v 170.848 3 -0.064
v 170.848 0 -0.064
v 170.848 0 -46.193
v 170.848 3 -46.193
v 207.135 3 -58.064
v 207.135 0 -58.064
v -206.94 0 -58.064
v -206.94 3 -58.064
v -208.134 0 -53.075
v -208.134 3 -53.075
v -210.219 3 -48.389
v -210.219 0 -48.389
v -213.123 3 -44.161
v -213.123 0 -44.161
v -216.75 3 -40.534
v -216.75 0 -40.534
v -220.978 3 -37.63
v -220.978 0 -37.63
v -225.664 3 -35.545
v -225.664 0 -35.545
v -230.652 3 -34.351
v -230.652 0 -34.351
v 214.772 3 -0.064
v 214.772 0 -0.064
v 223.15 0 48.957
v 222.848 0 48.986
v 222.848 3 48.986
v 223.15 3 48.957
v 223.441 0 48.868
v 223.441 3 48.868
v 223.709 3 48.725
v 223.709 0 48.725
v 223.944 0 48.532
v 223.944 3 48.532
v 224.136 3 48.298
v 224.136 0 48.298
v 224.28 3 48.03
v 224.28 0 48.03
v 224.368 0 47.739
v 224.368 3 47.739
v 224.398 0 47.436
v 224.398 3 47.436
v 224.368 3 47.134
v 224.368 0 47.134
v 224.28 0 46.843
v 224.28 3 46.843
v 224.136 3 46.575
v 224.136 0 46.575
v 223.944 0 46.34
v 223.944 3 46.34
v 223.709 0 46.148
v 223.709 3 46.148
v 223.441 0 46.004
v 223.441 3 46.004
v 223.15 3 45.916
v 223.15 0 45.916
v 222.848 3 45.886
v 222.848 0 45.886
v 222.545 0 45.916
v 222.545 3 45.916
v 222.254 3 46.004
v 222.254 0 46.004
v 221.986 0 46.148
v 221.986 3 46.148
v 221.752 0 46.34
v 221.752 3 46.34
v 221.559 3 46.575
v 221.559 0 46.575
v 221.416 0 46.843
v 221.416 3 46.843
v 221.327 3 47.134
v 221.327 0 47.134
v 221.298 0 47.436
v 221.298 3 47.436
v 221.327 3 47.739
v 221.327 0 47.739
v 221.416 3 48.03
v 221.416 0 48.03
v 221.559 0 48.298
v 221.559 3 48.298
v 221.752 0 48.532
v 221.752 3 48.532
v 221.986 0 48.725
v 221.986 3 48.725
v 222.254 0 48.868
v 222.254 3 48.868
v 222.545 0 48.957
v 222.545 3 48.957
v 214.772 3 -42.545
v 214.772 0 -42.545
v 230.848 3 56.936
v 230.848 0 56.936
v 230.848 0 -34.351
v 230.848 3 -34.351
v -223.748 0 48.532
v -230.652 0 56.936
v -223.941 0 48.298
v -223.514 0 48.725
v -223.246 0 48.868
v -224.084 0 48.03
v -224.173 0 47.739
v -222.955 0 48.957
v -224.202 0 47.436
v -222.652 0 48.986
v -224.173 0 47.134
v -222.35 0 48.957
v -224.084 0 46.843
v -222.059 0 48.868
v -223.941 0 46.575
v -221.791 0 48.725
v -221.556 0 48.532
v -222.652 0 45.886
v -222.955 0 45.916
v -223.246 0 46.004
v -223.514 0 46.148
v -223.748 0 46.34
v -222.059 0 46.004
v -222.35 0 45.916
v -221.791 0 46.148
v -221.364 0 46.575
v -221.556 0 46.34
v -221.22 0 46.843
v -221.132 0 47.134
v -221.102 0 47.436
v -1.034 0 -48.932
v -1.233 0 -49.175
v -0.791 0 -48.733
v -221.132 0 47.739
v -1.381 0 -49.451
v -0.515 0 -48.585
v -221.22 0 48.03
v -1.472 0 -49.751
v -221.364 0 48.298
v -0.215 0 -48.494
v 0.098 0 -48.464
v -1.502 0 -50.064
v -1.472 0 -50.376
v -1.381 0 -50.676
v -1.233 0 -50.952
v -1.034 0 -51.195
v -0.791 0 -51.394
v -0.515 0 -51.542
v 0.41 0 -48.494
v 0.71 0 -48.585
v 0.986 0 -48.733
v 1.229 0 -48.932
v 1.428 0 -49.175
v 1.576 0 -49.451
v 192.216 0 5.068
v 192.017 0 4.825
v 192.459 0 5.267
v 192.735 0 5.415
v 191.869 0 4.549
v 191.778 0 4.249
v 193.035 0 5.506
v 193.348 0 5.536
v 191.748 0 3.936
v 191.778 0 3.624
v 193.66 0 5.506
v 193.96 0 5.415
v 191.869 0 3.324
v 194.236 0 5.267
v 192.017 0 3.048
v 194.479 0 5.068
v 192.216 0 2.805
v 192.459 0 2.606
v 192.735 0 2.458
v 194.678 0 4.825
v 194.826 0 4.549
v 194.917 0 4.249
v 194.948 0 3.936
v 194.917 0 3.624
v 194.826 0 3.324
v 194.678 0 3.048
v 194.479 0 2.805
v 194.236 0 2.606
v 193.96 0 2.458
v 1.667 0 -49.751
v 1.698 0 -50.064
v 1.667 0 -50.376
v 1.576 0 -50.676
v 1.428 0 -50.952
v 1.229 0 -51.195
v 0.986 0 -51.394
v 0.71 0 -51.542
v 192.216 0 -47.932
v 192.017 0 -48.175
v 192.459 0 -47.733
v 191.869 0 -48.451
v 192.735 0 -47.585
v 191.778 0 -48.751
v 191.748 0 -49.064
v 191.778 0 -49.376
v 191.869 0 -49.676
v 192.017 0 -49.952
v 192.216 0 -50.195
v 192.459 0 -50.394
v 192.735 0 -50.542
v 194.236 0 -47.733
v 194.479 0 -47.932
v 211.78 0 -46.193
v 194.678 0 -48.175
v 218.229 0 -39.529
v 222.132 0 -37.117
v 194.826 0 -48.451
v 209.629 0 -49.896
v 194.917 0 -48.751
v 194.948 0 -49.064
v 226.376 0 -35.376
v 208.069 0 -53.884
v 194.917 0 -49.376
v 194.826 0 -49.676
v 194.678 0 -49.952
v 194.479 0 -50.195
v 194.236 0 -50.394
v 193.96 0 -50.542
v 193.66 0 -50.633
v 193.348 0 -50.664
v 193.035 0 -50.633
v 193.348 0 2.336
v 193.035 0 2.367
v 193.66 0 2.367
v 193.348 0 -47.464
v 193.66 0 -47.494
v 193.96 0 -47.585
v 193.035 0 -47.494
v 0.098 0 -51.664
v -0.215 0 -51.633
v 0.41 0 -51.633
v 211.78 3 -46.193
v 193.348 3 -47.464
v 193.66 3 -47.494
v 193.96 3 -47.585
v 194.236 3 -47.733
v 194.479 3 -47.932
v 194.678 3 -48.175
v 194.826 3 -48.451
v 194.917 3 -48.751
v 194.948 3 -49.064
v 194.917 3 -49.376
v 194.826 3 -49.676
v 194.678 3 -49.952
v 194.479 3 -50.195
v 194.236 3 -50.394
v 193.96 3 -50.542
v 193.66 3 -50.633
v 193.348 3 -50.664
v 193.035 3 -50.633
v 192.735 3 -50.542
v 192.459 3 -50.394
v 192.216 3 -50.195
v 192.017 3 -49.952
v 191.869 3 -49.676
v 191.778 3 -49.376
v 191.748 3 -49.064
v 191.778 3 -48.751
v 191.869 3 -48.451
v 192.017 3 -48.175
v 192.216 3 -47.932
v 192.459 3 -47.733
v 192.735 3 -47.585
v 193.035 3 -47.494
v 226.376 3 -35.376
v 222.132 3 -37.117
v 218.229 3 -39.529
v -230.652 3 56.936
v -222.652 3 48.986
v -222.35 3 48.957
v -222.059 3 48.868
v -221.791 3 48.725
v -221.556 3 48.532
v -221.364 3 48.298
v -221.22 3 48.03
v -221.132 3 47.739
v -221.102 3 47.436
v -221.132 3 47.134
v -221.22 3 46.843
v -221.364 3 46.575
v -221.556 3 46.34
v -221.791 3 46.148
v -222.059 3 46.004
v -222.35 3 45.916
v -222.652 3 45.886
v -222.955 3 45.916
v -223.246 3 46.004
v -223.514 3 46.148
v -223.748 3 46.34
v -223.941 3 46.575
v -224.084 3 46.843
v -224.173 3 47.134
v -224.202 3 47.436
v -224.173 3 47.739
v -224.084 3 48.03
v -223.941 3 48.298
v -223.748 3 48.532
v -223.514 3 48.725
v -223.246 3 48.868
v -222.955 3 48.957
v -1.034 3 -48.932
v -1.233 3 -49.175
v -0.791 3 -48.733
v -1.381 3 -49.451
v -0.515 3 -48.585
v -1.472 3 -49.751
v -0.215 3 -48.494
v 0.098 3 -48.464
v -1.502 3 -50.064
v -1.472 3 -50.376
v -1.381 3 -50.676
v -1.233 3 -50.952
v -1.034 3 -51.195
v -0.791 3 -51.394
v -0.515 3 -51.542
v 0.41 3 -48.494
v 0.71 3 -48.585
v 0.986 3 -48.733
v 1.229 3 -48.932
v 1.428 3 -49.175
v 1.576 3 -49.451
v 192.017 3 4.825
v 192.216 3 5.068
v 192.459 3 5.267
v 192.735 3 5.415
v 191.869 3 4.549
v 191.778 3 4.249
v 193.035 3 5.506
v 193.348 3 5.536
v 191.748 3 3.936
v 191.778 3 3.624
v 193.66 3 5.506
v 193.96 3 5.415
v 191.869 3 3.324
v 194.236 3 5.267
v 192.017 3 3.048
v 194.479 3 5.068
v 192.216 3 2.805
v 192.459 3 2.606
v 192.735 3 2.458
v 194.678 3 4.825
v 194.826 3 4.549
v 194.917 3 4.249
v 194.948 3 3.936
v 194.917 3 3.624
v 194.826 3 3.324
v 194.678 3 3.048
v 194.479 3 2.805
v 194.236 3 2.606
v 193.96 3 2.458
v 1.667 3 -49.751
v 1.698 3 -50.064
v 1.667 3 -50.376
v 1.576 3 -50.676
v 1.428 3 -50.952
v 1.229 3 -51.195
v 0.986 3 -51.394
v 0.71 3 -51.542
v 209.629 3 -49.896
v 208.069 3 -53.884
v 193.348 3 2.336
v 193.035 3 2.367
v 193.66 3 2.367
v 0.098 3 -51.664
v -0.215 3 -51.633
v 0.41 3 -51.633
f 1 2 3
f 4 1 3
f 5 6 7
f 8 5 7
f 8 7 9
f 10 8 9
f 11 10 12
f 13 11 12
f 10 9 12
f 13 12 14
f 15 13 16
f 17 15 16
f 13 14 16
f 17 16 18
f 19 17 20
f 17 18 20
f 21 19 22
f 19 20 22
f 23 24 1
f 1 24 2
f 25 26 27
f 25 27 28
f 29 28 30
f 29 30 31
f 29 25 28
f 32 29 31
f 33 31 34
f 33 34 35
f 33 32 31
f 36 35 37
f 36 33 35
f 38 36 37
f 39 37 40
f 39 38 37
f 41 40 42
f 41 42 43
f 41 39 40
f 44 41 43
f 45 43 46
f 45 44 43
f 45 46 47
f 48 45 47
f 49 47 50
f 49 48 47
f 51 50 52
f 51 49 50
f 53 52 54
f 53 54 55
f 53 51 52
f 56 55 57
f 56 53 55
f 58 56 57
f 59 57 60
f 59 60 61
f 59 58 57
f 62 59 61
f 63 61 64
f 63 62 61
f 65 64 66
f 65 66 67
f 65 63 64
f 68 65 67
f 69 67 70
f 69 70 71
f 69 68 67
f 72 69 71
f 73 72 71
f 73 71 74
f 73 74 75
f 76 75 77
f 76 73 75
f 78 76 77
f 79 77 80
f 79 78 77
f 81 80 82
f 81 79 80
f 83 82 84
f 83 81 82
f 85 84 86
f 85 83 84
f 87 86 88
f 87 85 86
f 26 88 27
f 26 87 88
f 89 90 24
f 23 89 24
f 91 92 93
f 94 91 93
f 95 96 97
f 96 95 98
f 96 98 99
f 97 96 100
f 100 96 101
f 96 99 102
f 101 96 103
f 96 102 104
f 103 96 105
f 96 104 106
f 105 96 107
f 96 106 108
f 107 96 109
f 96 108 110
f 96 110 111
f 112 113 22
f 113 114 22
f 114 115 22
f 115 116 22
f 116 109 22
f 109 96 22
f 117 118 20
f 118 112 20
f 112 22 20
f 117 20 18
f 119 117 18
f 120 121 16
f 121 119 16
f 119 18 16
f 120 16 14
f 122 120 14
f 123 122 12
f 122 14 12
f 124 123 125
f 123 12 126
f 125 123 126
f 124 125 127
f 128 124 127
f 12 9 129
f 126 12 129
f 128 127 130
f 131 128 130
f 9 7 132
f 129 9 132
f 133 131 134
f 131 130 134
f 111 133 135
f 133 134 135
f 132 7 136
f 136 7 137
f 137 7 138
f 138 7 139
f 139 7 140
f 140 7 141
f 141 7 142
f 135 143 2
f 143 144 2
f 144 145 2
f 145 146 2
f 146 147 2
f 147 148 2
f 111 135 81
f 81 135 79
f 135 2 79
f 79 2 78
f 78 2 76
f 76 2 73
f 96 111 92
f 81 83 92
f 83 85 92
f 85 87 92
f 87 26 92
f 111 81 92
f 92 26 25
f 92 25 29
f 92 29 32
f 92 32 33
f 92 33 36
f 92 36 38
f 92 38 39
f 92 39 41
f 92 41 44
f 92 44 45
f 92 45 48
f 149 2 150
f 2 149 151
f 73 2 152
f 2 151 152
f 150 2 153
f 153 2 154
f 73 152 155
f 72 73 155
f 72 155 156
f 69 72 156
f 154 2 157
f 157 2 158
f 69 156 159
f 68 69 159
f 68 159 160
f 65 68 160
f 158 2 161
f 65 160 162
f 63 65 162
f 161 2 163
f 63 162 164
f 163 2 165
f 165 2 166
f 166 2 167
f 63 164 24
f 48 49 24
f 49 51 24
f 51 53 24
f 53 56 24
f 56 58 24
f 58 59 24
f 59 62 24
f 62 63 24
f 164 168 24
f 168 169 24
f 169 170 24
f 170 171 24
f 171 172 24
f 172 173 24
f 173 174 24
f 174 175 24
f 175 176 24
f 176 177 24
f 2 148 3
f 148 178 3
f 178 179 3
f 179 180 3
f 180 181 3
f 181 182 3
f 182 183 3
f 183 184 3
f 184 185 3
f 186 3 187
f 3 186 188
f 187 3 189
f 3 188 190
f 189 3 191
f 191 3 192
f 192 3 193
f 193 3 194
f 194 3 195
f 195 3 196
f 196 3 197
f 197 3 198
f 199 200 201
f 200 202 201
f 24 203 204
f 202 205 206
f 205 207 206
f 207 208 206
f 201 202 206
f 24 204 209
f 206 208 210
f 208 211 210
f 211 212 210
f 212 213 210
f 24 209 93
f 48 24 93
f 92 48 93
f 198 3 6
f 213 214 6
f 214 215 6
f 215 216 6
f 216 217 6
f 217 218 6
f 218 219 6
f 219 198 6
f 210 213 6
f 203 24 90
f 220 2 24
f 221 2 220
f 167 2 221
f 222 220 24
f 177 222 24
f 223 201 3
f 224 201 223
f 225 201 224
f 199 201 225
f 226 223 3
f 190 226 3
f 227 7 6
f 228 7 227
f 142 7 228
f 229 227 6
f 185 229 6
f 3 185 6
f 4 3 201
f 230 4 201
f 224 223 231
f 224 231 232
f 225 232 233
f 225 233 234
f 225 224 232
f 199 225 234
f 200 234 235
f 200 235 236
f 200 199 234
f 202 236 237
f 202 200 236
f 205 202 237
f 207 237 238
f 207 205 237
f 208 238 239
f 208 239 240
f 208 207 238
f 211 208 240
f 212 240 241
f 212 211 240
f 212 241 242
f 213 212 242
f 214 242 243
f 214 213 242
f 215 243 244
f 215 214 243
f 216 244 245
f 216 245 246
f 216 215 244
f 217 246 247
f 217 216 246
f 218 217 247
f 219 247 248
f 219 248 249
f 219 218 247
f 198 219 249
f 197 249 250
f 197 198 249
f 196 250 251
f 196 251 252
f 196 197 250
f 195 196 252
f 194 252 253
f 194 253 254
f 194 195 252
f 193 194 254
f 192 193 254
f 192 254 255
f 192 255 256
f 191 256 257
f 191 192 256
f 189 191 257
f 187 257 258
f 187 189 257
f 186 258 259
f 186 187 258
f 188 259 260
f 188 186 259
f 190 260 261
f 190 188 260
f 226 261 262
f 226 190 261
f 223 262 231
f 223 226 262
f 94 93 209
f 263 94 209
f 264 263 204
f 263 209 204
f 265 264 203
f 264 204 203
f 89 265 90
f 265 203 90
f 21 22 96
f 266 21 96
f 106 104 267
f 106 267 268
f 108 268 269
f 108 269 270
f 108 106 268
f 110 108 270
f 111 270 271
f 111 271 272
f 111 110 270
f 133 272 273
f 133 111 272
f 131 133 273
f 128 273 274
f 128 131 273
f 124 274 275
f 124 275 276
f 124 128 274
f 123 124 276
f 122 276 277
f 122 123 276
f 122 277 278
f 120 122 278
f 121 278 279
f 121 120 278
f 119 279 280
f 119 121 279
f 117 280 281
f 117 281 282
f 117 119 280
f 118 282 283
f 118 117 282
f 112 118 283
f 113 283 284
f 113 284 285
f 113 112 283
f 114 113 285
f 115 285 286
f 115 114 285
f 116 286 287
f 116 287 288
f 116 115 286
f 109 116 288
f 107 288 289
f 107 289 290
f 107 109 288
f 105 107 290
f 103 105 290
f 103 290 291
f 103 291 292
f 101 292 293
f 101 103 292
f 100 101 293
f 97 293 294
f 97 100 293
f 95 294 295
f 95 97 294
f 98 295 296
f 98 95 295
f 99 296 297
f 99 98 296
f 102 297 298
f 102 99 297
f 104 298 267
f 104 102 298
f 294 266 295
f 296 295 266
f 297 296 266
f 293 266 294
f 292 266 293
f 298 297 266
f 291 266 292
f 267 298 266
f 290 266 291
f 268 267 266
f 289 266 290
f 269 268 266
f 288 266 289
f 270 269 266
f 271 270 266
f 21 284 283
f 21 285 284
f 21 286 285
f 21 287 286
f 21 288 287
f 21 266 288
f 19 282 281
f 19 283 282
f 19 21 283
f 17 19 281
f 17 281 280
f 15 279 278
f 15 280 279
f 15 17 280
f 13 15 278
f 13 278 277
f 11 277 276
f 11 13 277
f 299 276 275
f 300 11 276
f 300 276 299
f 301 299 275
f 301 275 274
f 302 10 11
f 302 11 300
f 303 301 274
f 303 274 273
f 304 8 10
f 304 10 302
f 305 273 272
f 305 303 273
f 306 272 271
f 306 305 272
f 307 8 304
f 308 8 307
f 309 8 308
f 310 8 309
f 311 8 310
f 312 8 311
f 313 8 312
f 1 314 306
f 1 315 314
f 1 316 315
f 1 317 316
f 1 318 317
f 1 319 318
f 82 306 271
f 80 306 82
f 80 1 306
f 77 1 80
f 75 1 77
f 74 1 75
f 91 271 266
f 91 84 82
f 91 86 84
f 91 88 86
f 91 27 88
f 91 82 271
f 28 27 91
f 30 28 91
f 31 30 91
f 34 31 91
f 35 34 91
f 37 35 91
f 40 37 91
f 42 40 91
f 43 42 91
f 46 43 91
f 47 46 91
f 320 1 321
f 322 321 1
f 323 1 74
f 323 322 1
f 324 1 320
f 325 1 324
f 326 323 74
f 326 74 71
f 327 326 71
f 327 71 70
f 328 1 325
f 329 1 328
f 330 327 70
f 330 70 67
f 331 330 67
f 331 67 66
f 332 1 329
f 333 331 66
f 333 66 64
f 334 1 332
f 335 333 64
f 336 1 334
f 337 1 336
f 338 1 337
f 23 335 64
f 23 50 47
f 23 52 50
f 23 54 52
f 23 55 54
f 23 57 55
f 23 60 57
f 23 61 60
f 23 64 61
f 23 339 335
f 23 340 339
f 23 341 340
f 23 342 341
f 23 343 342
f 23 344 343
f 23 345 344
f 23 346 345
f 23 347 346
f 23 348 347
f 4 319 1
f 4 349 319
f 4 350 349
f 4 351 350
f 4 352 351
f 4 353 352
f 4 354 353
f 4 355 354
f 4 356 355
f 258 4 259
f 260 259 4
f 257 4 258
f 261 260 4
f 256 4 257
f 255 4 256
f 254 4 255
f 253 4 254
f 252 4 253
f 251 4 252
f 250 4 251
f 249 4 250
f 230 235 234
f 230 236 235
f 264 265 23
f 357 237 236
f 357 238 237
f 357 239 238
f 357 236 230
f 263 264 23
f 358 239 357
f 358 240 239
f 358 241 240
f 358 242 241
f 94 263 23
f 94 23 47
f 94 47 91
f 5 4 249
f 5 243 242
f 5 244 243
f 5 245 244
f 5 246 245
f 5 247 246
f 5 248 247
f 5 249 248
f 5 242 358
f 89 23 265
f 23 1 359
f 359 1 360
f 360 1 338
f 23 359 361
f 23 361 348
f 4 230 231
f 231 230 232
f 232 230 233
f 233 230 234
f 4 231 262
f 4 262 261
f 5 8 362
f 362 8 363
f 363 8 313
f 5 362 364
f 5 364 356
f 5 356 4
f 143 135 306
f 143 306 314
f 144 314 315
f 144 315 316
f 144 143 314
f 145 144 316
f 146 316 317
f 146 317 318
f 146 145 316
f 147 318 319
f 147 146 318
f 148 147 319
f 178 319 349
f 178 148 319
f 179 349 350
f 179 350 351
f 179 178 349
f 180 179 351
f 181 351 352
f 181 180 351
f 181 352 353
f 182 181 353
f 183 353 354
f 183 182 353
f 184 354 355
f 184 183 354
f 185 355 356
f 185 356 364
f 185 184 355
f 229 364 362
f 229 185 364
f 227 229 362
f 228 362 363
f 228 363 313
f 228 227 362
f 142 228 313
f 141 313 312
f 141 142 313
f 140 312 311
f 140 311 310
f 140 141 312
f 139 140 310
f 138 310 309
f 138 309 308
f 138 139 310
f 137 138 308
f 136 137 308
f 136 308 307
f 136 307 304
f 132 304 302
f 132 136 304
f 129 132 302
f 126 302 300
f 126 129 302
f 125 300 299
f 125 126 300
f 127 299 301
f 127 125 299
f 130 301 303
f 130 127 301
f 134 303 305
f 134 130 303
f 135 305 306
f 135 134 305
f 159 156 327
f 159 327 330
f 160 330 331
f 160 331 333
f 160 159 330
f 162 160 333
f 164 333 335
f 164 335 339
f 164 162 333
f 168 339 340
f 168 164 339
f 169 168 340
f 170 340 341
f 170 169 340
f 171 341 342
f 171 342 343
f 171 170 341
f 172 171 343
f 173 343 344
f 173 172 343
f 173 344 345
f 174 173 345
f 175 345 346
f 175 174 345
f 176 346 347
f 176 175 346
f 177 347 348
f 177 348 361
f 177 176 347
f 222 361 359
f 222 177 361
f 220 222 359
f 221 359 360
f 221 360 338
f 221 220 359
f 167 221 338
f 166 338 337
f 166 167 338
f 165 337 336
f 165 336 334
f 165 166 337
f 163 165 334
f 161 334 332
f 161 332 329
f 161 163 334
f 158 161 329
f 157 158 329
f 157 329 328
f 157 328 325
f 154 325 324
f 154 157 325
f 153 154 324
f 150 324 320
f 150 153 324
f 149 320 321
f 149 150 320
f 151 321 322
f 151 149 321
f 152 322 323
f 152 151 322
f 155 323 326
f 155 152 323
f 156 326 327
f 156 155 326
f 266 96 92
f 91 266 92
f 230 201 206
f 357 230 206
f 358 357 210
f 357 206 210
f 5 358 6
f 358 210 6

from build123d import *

# Parameters (mm, degrees)
CROQUIS1_R              = 1.6
CROQUIS1_R_2            = 1.55
SALIENTE_EXTRUIR1_DEPTH = 3


with BuildPart() as part:
    # Croquis1 → Saliente-Extruir1 (new body)
    with BuildSketch(Plane(origin=(0, 0, 0), x_dir=(1, 0, 0), z_dir=(0, 1, 0))):
        with BuildLine():
            Line((230.847543198, -52.68112687), (230.847543198, 34.350751843))
            ThreePointArc((230.847543198, 34.350751843), (222.131671295, 37.117490889), (214.7720715, 42.544972702))
            Line((214.7720715, 42.544972702), (214.7720715, 0.063564764))
            Line((214.7720715, 0.063564764), (170.847543198, 0.063564764))
            Line((170.847543198, 0.063564764), (170.847543198, 46.193023152))
            Line((170.847543198, 46.193023152), (211.779688747, 46.193023152))
            ThreePointArc((211.779688747, 46.193023152), (208.772718477, 51.86045172), (207.134730277, 58.063564764))
            Line((207.134730277, 58.063564764), (-206.939643881, 58.063564764))
            ThreePointArc((-206.939643881, 58.063564764), (-214.853466929, 42.264574891), (-230.652456802, 34.350751843))
            Line((-230.652456802, 34.350751843), (-230.652456802, -52.936435236))
            Line((-230.652456802, -52.936435236), (-230.652456802, -56.936435236))
            Line((-230.652456802, -56.936435236), (230.847543198, -56.936435236))
            Line((230.847543198, -56.936435236), (230.847543198, -52.68112687))
        make_face()
        with Locations(Location((193.347543198, -3.936435236, 0), (0, 0, 270))):
            Circle(CROQUIS1_R, mode=Mode.SUBTRACT)
        with Locations(Location((193.347543198, 49.063564764, 0), (0, 0, 270))):
            Circle(CROQUIS1_R, mode=Mode.SUBTRACT)
        with Locations(Location((222.847543198, -47.436435236, 0), (0, 0, 270))):
            Circle(CROQUIS1_R_2, mode=Mode.SUBTRACT)
        with Locations(Location((0.097543198, 50.063564764, 0), (0, 0, 270))):
            Circle(CROQUIS1_R, mode=Mode.SUBTRACT)
        with Locations(Location((-222.652456802, -47.436435236, 0), (0, 0, 270))):
            Circle(CROQUIS1_R_2, mode=Mode.SUBTRACT)
    extrude(amount=SALIENTE_EXTRUIR1_DEPTH)


solid = part.part
